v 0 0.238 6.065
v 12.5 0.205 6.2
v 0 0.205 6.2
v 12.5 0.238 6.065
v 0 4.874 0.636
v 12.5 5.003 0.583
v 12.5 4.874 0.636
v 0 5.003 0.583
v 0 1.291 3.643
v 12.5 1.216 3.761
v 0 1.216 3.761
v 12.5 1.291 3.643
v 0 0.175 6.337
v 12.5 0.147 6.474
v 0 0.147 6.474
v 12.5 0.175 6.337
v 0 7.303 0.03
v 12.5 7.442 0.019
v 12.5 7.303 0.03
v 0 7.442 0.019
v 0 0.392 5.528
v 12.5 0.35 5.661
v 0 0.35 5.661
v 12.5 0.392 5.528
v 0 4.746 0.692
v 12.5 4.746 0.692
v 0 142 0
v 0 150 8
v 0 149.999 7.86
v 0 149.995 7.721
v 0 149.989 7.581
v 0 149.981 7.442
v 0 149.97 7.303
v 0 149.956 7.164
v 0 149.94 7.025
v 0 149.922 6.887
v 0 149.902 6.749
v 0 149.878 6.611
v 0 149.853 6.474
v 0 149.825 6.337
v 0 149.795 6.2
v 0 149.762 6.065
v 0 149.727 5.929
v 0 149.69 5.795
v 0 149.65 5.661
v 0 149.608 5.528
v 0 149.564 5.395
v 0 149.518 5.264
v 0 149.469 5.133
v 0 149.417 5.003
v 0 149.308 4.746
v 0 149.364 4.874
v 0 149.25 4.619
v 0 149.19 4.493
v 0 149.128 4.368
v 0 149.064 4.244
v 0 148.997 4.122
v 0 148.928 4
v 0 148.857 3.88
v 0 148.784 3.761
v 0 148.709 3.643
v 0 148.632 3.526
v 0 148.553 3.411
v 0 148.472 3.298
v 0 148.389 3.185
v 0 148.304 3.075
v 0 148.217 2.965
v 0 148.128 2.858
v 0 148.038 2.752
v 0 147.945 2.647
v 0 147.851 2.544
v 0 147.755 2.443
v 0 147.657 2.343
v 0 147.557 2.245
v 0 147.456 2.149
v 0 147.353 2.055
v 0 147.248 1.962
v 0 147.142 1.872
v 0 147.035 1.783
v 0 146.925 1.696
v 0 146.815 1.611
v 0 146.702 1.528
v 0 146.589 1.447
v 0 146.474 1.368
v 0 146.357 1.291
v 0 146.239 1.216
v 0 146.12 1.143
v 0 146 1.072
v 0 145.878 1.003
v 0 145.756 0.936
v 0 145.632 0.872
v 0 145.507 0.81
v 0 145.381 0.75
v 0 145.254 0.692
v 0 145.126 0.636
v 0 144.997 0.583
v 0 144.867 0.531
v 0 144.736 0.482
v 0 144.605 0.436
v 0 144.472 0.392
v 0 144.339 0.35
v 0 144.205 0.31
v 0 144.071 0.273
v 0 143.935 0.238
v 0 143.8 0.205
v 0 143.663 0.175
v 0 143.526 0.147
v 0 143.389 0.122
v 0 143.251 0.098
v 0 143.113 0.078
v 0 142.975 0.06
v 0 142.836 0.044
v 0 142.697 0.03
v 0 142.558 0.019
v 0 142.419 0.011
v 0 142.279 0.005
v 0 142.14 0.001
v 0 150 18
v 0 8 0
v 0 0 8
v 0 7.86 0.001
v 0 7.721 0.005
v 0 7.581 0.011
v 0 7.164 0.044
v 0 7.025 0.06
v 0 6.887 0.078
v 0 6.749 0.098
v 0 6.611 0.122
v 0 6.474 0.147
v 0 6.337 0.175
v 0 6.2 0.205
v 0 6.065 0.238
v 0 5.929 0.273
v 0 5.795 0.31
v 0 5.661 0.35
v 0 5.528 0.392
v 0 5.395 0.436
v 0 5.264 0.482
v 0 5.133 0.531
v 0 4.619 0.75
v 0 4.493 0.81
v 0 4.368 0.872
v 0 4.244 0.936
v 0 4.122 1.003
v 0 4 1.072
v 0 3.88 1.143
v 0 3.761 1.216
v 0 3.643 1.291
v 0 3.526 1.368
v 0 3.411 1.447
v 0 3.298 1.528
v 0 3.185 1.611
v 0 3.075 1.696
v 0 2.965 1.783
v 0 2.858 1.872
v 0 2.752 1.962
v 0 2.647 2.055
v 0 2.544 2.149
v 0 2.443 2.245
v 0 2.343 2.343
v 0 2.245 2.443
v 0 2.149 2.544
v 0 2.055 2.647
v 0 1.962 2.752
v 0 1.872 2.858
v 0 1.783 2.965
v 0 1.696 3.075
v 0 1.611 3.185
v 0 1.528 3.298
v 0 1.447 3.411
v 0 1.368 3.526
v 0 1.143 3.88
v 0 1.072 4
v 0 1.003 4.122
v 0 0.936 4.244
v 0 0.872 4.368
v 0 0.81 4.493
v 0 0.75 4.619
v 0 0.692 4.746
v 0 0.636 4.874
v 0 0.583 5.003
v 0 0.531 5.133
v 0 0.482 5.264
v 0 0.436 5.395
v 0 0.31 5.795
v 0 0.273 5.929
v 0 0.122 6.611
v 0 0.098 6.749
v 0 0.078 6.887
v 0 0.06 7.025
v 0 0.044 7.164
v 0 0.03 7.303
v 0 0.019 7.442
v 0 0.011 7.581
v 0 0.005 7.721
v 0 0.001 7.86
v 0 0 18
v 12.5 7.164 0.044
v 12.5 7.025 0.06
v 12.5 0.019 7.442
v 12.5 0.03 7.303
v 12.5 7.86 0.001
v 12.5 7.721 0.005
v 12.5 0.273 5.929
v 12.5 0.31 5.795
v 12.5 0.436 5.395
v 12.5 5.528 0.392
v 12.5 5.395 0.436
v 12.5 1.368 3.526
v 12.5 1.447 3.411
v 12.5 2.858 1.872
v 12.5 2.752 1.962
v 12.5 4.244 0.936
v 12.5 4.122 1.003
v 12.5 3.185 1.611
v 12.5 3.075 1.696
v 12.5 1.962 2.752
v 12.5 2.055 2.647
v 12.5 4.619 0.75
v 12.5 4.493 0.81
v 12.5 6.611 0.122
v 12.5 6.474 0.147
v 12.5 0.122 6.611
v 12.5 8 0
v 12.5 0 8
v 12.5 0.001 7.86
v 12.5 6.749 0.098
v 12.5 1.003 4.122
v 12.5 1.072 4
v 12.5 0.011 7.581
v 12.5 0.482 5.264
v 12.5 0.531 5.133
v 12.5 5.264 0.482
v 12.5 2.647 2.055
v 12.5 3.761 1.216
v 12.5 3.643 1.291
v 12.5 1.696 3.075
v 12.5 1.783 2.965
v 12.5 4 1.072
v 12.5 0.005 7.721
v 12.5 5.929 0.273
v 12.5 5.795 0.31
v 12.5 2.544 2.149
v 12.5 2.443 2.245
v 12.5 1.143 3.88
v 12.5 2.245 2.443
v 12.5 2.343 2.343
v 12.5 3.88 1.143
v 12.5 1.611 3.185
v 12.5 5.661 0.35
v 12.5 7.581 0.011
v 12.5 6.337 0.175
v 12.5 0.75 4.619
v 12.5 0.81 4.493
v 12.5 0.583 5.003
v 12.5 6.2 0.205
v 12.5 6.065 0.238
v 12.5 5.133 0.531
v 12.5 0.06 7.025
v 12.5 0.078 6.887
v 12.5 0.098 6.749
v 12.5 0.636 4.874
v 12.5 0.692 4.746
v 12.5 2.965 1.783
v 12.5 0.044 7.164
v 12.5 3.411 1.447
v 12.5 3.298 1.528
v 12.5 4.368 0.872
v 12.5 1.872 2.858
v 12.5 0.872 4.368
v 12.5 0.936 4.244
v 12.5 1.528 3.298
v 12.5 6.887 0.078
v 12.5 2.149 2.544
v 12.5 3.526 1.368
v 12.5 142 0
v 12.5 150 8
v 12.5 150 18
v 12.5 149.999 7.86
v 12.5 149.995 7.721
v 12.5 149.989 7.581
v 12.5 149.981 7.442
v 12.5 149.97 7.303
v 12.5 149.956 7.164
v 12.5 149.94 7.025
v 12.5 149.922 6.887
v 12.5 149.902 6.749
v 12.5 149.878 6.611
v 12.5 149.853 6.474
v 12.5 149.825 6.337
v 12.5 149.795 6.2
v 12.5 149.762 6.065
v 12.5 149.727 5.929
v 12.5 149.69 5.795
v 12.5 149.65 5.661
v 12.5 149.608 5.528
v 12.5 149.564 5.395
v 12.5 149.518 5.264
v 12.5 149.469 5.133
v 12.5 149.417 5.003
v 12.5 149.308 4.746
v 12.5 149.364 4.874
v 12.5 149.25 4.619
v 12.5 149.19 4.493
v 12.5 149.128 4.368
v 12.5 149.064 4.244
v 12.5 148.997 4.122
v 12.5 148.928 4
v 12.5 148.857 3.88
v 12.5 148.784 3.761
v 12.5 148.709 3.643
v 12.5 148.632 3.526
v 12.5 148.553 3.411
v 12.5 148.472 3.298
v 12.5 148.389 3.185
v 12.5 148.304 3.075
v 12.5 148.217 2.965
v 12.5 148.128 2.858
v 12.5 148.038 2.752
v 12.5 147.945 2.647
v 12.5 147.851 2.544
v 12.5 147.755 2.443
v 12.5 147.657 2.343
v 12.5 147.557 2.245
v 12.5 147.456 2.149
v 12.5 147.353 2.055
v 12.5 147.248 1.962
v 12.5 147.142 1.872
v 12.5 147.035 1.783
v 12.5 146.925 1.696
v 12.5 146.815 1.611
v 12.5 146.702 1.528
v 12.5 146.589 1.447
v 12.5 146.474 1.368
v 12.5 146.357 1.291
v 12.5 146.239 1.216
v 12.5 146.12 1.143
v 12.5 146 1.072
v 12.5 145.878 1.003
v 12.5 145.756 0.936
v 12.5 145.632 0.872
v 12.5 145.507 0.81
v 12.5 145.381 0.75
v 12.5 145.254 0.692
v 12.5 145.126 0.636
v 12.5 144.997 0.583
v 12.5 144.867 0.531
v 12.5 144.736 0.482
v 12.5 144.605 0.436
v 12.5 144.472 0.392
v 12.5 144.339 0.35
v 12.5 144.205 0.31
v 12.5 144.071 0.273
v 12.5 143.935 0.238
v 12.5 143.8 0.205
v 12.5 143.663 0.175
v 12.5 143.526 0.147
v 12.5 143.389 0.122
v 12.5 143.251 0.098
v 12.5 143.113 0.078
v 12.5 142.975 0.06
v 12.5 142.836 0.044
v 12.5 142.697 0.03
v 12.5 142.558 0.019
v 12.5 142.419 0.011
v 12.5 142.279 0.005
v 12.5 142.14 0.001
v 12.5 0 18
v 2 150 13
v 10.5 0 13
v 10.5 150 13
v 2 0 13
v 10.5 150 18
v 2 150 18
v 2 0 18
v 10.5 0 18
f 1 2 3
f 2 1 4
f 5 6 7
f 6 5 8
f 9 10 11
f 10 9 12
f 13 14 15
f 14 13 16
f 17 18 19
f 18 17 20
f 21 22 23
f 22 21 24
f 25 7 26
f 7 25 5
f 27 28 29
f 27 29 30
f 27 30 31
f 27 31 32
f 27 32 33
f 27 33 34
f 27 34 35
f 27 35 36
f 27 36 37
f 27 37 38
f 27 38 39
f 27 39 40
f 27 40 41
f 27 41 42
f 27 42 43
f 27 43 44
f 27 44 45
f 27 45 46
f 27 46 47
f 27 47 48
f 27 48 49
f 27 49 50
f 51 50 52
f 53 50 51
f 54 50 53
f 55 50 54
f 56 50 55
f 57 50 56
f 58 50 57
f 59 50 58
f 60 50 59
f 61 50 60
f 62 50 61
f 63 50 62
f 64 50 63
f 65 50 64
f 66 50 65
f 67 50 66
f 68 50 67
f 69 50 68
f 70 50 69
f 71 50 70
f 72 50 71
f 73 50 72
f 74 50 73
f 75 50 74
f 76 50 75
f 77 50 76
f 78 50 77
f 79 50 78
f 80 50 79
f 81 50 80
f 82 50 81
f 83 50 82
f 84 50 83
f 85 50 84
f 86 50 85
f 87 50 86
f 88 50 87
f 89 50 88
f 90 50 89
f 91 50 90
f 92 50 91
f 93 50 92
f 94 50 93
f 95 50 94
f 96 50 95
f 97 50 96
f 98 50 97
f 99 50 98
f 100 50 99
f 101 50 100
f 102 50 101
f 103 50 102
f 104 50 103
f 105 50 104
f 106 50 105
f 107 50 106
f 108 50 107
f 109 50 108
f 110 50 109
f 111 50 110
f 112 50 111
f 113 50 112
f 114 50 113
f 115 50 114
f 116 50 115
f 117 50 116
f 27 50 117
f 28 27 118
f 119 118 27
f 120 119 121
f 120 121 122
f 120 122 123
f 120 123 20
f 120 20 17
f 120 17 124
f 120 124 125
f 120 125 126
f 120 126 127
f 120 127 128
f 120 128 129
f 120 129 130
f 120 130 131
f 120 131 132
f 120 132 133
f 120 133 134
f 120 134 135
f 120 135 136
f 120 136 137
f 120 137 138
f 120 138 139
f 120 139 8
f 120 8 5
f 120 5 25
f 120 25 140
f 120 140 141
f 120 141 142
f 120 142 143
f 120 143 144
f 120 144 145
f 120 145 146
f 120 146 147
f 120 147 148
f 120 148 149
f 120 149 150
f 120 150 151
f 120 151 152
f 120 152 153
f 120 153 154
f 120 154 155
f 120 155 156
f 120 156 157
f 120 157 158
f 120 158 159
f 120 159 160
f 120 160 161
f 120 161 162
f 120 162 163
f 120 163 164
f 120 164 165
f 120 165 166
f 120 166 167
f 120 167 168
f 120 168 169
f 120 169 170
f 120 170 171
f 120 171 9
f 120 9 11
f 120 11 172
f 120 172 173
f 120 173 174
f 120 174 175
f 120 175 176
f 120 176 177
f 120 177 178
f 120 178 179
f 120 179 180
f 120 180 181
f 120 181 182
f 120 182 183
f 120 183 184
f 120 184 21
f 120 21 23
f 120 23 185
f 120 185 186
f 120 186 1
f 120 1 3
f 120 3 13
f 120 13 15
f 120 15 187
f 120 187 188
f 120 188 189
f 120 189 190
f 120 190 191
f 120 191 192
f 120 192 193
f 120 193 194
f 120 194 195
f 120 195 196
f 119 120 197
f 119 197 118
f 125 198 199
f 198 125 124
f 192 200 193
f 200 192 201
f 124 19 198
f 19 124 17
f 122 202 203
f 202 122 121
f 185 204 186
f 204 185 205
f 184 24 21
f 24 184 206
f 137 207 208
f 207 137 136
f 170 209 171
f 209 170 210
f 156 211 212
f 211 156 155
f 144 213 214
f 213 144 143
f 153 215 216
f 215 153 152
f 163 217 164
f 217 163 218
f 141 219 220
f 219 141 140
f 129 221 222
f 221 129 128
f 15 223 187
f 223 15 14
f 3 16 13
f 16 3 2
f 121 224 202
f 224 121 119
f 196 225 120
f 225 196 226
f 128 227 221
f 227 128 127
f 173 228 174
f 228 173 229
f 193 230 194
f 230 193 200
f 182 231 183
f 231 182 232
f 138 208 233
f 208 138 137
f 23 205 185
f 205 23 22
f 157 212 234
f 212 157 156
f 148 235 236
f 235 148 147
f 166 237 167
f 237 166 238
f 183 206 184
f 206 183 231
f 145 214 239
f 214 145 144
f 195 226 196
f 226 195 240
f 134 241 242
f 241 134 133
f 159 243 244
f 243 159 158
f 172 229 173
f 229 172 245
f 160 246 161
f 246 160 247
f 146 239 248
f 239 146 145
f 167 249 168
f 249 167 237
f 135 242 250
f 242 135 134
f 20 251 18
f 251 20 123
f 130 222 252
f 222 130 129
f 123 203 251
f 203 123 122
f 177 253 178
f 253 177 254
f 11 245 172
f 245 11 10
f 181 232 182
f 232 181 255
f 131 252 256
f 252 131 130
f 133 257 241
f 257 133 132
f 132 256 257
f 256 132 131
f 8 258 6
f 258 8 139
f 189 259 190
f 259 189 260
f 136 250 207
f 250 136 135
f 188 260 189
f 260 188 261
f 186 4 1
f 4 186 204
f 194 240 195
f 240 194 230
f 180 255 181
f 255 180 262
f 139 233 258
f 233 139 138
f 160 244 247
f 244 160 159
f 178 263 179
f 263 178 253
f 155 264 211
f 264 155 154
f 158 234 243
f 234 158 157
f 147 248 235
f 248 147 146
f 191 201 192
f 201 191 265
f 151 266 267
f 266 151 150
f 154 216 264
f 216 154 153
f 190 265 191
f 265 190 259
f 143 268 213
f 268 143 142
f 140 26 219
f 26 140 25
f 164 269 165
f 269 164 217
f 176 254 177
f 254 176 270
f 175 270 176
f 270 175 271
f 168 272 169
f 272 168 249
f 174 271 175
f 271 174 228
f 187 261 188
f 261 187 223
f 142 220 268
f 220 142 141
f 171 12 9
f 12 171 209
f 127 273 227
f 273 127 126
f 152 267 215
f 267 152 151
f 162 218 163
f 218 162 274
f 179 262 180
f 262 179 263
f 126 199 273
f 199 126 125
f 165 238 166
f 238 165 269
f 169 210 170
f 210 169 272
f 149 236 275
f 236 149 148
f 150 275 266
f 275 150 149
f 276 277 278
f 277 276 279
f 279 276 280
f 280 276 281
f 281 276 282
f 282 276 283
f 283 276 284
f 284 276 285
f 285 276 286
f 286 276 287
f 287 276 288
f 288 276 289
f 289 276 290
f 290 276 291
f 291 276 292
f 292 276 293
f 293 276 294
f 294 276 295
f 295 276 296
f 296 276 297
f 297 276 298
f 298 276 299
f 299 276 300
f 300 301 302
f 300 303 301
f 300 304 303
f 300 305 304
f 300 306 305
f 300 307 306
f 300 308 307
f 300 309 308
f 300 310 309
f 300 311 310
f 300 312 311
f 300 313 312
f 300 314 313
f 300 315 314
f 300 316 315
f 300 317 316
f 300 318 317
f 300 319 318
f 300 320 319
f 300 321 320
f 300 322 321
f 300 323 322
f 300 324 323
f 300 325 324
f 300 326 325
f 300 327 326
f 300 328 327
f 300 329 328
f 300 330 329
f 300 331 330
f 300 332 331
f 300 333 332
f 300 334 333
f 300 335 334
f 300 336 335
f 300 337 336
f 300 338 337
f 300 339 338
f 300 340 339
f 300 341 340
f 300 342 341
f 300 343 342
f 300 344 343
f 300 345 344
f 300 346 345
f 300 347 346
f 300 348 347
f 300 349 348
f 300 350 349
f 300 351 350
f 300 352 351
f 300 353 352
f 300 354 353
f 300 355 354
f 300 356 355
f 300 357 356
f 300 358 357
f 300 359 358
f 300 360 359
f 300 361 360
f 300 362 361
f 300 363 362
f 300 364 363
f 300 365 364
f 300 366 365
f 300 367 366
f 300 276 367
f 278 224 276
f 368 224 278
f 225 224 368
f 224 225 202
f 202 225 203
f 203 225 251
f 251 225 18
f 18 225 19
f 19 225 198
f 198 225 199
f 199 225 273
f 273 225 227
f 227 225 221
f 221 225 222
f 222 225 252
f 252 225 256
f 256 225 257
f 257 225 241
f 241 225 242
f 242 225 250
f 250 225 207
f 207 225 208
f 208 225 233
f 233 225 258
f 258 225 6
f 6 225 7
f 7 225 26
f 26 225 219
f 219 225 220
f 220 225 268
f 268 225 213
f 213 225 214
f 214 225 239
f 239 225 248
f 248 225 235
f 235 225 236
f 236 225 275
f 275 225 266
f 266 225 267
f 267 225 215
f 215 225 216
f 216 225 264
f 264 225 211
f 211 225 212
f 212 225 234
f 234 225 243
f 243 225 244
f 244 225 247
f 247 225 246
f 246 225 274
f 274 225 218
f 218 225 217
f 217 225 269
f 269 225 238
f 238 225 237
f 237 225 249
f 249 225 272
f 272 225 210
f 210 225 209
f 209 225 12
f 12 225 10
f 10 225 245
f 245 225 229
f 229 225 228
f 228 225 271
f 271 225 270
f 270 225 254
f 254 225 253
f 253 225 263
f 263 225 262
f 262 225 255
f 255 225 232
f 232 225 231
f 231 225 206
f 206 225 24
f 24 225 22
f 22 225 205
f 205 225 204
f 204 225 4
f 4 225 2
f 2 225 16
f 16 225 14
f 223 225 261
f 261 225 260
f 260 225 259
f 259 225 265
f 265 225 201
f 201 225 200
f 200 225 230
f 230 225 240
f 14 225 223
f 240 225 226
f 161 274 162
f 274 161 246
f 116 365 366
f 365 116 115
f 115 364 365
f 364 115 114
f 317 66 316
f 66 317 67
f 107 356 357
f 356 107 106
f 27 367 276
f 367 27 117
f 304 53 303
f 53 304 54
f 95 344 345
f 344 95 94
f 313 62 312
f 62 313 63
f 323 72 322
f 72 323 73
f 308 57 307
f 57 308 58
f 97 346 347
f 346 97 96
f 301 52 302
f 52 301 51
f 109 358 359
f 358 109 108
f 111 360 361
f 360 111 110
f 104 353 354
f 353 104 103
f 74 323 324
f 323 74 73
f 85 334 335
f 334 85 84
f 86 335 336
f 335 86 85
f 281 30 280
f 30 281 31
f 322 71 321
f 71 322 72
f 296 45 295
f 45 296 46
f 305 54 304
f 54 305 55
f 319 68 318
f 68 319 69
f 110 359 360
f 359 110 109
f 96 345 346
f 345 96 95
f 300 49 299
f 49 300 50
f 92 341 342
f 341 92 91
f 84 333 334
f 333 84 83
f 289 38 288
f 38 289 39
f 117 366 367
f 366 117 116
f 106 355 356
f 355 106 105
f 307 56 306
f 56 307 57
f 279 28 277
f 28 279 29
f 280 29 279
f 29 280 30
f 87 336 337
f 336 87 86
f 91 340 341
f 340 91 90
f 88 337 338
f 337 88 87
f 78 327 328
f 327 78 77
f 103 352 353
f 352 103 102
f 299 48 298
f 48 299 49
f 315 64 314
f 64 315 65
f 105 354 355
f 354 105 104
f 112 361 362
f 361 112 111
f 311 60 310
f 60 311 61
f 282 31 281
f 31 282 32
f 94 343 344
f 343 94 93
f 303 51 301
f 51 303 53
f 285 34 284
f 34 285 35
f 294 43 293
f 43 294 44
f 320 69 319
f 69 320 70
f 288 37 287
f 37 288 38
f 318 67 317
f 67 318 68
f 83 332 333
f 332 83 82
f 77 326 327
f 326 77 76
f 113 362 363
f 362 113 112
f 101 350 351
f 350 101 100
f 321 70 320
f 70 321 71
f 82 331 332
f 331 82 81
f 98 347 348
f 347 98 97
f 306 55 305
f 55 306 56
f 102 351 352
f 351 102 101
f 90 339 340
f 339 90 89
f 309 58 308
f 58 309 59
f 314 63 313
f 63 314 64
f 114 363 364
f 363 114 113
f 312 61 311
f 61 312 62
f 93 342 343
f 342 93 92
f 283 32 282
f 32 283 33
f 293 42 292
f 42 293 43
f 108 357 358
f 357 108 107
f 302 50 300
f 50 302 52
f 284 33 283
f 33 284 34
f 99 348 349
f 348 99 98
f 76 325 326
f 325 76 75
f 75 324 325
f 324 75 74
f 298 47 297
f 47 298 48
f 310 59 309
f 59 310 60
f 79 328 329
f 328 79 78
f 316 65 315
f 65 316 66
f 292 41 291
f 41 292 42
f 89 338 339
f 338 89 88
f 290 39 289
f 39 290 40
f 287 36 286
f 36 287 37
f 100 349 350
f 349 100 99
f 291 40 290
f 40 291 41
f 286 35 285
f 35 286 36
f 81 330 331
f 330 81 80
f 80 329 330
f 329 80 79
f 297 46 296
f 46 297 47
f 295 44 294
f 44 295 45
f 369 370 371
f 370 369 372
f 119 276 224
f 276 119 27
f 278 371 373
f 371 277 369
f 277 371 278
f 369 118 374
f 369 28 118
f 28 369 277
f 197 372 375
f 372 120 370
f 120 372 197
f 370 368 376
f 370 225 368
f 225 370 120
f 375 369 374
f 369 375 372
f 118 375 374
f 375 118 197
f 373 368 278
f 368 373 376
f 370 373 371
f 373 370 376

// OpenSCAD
/* 
 * Protective end strip for panel of imaging surface for autonomous moth 
 * trap. See https://amt.hobern.net/ for more detail.
 *
 * Author: Donald Hobern
 * Copyright: Copyright 2021, Donald Hobern
 * License: CC0
 * Version: 1.0.0
 * Email: dhobern@gmail.com
 */

length = 150; 
height = 13;
width = 8.5;
cornerradius = 8;
extension = 5;
thickness = 2;

// To adjust design and ensure that the design is at least mostly manifold.
fudge = 0.1;
fudge2 = 0.2;

$fn = 360;

union() {
    difference() {
        // main block
        union() {
            translate([0, cornerradius, 0]) {
                cube([width + 2 * thickness, length - 2 * cornerradius, height]);
            }
            translate([0, 0, cornerradius]) {
                cube([width + 2 * thickness, length, height - cornerradius]);
            }
            for (i = [cornerradius, length - cornerradius]) {
                translate([0, i, cornerradius]) rotate([0, 90, 0]) {
                    cylinder(d = cornerradius * 2, h = width + 2 * thickness);
                }
            }
        }
        translate([-fudge, -fudge, height]) {
            cube([width + 2 * thickness + fudge2, length + fudge2, cornerradius + fudge]);
        }
    }
    for(i = [0, thickness + width]) {
        translate([i, 0, height - fudge]) {
           cube([thickness,  length, extension + fudge]);
        }
    }
}
